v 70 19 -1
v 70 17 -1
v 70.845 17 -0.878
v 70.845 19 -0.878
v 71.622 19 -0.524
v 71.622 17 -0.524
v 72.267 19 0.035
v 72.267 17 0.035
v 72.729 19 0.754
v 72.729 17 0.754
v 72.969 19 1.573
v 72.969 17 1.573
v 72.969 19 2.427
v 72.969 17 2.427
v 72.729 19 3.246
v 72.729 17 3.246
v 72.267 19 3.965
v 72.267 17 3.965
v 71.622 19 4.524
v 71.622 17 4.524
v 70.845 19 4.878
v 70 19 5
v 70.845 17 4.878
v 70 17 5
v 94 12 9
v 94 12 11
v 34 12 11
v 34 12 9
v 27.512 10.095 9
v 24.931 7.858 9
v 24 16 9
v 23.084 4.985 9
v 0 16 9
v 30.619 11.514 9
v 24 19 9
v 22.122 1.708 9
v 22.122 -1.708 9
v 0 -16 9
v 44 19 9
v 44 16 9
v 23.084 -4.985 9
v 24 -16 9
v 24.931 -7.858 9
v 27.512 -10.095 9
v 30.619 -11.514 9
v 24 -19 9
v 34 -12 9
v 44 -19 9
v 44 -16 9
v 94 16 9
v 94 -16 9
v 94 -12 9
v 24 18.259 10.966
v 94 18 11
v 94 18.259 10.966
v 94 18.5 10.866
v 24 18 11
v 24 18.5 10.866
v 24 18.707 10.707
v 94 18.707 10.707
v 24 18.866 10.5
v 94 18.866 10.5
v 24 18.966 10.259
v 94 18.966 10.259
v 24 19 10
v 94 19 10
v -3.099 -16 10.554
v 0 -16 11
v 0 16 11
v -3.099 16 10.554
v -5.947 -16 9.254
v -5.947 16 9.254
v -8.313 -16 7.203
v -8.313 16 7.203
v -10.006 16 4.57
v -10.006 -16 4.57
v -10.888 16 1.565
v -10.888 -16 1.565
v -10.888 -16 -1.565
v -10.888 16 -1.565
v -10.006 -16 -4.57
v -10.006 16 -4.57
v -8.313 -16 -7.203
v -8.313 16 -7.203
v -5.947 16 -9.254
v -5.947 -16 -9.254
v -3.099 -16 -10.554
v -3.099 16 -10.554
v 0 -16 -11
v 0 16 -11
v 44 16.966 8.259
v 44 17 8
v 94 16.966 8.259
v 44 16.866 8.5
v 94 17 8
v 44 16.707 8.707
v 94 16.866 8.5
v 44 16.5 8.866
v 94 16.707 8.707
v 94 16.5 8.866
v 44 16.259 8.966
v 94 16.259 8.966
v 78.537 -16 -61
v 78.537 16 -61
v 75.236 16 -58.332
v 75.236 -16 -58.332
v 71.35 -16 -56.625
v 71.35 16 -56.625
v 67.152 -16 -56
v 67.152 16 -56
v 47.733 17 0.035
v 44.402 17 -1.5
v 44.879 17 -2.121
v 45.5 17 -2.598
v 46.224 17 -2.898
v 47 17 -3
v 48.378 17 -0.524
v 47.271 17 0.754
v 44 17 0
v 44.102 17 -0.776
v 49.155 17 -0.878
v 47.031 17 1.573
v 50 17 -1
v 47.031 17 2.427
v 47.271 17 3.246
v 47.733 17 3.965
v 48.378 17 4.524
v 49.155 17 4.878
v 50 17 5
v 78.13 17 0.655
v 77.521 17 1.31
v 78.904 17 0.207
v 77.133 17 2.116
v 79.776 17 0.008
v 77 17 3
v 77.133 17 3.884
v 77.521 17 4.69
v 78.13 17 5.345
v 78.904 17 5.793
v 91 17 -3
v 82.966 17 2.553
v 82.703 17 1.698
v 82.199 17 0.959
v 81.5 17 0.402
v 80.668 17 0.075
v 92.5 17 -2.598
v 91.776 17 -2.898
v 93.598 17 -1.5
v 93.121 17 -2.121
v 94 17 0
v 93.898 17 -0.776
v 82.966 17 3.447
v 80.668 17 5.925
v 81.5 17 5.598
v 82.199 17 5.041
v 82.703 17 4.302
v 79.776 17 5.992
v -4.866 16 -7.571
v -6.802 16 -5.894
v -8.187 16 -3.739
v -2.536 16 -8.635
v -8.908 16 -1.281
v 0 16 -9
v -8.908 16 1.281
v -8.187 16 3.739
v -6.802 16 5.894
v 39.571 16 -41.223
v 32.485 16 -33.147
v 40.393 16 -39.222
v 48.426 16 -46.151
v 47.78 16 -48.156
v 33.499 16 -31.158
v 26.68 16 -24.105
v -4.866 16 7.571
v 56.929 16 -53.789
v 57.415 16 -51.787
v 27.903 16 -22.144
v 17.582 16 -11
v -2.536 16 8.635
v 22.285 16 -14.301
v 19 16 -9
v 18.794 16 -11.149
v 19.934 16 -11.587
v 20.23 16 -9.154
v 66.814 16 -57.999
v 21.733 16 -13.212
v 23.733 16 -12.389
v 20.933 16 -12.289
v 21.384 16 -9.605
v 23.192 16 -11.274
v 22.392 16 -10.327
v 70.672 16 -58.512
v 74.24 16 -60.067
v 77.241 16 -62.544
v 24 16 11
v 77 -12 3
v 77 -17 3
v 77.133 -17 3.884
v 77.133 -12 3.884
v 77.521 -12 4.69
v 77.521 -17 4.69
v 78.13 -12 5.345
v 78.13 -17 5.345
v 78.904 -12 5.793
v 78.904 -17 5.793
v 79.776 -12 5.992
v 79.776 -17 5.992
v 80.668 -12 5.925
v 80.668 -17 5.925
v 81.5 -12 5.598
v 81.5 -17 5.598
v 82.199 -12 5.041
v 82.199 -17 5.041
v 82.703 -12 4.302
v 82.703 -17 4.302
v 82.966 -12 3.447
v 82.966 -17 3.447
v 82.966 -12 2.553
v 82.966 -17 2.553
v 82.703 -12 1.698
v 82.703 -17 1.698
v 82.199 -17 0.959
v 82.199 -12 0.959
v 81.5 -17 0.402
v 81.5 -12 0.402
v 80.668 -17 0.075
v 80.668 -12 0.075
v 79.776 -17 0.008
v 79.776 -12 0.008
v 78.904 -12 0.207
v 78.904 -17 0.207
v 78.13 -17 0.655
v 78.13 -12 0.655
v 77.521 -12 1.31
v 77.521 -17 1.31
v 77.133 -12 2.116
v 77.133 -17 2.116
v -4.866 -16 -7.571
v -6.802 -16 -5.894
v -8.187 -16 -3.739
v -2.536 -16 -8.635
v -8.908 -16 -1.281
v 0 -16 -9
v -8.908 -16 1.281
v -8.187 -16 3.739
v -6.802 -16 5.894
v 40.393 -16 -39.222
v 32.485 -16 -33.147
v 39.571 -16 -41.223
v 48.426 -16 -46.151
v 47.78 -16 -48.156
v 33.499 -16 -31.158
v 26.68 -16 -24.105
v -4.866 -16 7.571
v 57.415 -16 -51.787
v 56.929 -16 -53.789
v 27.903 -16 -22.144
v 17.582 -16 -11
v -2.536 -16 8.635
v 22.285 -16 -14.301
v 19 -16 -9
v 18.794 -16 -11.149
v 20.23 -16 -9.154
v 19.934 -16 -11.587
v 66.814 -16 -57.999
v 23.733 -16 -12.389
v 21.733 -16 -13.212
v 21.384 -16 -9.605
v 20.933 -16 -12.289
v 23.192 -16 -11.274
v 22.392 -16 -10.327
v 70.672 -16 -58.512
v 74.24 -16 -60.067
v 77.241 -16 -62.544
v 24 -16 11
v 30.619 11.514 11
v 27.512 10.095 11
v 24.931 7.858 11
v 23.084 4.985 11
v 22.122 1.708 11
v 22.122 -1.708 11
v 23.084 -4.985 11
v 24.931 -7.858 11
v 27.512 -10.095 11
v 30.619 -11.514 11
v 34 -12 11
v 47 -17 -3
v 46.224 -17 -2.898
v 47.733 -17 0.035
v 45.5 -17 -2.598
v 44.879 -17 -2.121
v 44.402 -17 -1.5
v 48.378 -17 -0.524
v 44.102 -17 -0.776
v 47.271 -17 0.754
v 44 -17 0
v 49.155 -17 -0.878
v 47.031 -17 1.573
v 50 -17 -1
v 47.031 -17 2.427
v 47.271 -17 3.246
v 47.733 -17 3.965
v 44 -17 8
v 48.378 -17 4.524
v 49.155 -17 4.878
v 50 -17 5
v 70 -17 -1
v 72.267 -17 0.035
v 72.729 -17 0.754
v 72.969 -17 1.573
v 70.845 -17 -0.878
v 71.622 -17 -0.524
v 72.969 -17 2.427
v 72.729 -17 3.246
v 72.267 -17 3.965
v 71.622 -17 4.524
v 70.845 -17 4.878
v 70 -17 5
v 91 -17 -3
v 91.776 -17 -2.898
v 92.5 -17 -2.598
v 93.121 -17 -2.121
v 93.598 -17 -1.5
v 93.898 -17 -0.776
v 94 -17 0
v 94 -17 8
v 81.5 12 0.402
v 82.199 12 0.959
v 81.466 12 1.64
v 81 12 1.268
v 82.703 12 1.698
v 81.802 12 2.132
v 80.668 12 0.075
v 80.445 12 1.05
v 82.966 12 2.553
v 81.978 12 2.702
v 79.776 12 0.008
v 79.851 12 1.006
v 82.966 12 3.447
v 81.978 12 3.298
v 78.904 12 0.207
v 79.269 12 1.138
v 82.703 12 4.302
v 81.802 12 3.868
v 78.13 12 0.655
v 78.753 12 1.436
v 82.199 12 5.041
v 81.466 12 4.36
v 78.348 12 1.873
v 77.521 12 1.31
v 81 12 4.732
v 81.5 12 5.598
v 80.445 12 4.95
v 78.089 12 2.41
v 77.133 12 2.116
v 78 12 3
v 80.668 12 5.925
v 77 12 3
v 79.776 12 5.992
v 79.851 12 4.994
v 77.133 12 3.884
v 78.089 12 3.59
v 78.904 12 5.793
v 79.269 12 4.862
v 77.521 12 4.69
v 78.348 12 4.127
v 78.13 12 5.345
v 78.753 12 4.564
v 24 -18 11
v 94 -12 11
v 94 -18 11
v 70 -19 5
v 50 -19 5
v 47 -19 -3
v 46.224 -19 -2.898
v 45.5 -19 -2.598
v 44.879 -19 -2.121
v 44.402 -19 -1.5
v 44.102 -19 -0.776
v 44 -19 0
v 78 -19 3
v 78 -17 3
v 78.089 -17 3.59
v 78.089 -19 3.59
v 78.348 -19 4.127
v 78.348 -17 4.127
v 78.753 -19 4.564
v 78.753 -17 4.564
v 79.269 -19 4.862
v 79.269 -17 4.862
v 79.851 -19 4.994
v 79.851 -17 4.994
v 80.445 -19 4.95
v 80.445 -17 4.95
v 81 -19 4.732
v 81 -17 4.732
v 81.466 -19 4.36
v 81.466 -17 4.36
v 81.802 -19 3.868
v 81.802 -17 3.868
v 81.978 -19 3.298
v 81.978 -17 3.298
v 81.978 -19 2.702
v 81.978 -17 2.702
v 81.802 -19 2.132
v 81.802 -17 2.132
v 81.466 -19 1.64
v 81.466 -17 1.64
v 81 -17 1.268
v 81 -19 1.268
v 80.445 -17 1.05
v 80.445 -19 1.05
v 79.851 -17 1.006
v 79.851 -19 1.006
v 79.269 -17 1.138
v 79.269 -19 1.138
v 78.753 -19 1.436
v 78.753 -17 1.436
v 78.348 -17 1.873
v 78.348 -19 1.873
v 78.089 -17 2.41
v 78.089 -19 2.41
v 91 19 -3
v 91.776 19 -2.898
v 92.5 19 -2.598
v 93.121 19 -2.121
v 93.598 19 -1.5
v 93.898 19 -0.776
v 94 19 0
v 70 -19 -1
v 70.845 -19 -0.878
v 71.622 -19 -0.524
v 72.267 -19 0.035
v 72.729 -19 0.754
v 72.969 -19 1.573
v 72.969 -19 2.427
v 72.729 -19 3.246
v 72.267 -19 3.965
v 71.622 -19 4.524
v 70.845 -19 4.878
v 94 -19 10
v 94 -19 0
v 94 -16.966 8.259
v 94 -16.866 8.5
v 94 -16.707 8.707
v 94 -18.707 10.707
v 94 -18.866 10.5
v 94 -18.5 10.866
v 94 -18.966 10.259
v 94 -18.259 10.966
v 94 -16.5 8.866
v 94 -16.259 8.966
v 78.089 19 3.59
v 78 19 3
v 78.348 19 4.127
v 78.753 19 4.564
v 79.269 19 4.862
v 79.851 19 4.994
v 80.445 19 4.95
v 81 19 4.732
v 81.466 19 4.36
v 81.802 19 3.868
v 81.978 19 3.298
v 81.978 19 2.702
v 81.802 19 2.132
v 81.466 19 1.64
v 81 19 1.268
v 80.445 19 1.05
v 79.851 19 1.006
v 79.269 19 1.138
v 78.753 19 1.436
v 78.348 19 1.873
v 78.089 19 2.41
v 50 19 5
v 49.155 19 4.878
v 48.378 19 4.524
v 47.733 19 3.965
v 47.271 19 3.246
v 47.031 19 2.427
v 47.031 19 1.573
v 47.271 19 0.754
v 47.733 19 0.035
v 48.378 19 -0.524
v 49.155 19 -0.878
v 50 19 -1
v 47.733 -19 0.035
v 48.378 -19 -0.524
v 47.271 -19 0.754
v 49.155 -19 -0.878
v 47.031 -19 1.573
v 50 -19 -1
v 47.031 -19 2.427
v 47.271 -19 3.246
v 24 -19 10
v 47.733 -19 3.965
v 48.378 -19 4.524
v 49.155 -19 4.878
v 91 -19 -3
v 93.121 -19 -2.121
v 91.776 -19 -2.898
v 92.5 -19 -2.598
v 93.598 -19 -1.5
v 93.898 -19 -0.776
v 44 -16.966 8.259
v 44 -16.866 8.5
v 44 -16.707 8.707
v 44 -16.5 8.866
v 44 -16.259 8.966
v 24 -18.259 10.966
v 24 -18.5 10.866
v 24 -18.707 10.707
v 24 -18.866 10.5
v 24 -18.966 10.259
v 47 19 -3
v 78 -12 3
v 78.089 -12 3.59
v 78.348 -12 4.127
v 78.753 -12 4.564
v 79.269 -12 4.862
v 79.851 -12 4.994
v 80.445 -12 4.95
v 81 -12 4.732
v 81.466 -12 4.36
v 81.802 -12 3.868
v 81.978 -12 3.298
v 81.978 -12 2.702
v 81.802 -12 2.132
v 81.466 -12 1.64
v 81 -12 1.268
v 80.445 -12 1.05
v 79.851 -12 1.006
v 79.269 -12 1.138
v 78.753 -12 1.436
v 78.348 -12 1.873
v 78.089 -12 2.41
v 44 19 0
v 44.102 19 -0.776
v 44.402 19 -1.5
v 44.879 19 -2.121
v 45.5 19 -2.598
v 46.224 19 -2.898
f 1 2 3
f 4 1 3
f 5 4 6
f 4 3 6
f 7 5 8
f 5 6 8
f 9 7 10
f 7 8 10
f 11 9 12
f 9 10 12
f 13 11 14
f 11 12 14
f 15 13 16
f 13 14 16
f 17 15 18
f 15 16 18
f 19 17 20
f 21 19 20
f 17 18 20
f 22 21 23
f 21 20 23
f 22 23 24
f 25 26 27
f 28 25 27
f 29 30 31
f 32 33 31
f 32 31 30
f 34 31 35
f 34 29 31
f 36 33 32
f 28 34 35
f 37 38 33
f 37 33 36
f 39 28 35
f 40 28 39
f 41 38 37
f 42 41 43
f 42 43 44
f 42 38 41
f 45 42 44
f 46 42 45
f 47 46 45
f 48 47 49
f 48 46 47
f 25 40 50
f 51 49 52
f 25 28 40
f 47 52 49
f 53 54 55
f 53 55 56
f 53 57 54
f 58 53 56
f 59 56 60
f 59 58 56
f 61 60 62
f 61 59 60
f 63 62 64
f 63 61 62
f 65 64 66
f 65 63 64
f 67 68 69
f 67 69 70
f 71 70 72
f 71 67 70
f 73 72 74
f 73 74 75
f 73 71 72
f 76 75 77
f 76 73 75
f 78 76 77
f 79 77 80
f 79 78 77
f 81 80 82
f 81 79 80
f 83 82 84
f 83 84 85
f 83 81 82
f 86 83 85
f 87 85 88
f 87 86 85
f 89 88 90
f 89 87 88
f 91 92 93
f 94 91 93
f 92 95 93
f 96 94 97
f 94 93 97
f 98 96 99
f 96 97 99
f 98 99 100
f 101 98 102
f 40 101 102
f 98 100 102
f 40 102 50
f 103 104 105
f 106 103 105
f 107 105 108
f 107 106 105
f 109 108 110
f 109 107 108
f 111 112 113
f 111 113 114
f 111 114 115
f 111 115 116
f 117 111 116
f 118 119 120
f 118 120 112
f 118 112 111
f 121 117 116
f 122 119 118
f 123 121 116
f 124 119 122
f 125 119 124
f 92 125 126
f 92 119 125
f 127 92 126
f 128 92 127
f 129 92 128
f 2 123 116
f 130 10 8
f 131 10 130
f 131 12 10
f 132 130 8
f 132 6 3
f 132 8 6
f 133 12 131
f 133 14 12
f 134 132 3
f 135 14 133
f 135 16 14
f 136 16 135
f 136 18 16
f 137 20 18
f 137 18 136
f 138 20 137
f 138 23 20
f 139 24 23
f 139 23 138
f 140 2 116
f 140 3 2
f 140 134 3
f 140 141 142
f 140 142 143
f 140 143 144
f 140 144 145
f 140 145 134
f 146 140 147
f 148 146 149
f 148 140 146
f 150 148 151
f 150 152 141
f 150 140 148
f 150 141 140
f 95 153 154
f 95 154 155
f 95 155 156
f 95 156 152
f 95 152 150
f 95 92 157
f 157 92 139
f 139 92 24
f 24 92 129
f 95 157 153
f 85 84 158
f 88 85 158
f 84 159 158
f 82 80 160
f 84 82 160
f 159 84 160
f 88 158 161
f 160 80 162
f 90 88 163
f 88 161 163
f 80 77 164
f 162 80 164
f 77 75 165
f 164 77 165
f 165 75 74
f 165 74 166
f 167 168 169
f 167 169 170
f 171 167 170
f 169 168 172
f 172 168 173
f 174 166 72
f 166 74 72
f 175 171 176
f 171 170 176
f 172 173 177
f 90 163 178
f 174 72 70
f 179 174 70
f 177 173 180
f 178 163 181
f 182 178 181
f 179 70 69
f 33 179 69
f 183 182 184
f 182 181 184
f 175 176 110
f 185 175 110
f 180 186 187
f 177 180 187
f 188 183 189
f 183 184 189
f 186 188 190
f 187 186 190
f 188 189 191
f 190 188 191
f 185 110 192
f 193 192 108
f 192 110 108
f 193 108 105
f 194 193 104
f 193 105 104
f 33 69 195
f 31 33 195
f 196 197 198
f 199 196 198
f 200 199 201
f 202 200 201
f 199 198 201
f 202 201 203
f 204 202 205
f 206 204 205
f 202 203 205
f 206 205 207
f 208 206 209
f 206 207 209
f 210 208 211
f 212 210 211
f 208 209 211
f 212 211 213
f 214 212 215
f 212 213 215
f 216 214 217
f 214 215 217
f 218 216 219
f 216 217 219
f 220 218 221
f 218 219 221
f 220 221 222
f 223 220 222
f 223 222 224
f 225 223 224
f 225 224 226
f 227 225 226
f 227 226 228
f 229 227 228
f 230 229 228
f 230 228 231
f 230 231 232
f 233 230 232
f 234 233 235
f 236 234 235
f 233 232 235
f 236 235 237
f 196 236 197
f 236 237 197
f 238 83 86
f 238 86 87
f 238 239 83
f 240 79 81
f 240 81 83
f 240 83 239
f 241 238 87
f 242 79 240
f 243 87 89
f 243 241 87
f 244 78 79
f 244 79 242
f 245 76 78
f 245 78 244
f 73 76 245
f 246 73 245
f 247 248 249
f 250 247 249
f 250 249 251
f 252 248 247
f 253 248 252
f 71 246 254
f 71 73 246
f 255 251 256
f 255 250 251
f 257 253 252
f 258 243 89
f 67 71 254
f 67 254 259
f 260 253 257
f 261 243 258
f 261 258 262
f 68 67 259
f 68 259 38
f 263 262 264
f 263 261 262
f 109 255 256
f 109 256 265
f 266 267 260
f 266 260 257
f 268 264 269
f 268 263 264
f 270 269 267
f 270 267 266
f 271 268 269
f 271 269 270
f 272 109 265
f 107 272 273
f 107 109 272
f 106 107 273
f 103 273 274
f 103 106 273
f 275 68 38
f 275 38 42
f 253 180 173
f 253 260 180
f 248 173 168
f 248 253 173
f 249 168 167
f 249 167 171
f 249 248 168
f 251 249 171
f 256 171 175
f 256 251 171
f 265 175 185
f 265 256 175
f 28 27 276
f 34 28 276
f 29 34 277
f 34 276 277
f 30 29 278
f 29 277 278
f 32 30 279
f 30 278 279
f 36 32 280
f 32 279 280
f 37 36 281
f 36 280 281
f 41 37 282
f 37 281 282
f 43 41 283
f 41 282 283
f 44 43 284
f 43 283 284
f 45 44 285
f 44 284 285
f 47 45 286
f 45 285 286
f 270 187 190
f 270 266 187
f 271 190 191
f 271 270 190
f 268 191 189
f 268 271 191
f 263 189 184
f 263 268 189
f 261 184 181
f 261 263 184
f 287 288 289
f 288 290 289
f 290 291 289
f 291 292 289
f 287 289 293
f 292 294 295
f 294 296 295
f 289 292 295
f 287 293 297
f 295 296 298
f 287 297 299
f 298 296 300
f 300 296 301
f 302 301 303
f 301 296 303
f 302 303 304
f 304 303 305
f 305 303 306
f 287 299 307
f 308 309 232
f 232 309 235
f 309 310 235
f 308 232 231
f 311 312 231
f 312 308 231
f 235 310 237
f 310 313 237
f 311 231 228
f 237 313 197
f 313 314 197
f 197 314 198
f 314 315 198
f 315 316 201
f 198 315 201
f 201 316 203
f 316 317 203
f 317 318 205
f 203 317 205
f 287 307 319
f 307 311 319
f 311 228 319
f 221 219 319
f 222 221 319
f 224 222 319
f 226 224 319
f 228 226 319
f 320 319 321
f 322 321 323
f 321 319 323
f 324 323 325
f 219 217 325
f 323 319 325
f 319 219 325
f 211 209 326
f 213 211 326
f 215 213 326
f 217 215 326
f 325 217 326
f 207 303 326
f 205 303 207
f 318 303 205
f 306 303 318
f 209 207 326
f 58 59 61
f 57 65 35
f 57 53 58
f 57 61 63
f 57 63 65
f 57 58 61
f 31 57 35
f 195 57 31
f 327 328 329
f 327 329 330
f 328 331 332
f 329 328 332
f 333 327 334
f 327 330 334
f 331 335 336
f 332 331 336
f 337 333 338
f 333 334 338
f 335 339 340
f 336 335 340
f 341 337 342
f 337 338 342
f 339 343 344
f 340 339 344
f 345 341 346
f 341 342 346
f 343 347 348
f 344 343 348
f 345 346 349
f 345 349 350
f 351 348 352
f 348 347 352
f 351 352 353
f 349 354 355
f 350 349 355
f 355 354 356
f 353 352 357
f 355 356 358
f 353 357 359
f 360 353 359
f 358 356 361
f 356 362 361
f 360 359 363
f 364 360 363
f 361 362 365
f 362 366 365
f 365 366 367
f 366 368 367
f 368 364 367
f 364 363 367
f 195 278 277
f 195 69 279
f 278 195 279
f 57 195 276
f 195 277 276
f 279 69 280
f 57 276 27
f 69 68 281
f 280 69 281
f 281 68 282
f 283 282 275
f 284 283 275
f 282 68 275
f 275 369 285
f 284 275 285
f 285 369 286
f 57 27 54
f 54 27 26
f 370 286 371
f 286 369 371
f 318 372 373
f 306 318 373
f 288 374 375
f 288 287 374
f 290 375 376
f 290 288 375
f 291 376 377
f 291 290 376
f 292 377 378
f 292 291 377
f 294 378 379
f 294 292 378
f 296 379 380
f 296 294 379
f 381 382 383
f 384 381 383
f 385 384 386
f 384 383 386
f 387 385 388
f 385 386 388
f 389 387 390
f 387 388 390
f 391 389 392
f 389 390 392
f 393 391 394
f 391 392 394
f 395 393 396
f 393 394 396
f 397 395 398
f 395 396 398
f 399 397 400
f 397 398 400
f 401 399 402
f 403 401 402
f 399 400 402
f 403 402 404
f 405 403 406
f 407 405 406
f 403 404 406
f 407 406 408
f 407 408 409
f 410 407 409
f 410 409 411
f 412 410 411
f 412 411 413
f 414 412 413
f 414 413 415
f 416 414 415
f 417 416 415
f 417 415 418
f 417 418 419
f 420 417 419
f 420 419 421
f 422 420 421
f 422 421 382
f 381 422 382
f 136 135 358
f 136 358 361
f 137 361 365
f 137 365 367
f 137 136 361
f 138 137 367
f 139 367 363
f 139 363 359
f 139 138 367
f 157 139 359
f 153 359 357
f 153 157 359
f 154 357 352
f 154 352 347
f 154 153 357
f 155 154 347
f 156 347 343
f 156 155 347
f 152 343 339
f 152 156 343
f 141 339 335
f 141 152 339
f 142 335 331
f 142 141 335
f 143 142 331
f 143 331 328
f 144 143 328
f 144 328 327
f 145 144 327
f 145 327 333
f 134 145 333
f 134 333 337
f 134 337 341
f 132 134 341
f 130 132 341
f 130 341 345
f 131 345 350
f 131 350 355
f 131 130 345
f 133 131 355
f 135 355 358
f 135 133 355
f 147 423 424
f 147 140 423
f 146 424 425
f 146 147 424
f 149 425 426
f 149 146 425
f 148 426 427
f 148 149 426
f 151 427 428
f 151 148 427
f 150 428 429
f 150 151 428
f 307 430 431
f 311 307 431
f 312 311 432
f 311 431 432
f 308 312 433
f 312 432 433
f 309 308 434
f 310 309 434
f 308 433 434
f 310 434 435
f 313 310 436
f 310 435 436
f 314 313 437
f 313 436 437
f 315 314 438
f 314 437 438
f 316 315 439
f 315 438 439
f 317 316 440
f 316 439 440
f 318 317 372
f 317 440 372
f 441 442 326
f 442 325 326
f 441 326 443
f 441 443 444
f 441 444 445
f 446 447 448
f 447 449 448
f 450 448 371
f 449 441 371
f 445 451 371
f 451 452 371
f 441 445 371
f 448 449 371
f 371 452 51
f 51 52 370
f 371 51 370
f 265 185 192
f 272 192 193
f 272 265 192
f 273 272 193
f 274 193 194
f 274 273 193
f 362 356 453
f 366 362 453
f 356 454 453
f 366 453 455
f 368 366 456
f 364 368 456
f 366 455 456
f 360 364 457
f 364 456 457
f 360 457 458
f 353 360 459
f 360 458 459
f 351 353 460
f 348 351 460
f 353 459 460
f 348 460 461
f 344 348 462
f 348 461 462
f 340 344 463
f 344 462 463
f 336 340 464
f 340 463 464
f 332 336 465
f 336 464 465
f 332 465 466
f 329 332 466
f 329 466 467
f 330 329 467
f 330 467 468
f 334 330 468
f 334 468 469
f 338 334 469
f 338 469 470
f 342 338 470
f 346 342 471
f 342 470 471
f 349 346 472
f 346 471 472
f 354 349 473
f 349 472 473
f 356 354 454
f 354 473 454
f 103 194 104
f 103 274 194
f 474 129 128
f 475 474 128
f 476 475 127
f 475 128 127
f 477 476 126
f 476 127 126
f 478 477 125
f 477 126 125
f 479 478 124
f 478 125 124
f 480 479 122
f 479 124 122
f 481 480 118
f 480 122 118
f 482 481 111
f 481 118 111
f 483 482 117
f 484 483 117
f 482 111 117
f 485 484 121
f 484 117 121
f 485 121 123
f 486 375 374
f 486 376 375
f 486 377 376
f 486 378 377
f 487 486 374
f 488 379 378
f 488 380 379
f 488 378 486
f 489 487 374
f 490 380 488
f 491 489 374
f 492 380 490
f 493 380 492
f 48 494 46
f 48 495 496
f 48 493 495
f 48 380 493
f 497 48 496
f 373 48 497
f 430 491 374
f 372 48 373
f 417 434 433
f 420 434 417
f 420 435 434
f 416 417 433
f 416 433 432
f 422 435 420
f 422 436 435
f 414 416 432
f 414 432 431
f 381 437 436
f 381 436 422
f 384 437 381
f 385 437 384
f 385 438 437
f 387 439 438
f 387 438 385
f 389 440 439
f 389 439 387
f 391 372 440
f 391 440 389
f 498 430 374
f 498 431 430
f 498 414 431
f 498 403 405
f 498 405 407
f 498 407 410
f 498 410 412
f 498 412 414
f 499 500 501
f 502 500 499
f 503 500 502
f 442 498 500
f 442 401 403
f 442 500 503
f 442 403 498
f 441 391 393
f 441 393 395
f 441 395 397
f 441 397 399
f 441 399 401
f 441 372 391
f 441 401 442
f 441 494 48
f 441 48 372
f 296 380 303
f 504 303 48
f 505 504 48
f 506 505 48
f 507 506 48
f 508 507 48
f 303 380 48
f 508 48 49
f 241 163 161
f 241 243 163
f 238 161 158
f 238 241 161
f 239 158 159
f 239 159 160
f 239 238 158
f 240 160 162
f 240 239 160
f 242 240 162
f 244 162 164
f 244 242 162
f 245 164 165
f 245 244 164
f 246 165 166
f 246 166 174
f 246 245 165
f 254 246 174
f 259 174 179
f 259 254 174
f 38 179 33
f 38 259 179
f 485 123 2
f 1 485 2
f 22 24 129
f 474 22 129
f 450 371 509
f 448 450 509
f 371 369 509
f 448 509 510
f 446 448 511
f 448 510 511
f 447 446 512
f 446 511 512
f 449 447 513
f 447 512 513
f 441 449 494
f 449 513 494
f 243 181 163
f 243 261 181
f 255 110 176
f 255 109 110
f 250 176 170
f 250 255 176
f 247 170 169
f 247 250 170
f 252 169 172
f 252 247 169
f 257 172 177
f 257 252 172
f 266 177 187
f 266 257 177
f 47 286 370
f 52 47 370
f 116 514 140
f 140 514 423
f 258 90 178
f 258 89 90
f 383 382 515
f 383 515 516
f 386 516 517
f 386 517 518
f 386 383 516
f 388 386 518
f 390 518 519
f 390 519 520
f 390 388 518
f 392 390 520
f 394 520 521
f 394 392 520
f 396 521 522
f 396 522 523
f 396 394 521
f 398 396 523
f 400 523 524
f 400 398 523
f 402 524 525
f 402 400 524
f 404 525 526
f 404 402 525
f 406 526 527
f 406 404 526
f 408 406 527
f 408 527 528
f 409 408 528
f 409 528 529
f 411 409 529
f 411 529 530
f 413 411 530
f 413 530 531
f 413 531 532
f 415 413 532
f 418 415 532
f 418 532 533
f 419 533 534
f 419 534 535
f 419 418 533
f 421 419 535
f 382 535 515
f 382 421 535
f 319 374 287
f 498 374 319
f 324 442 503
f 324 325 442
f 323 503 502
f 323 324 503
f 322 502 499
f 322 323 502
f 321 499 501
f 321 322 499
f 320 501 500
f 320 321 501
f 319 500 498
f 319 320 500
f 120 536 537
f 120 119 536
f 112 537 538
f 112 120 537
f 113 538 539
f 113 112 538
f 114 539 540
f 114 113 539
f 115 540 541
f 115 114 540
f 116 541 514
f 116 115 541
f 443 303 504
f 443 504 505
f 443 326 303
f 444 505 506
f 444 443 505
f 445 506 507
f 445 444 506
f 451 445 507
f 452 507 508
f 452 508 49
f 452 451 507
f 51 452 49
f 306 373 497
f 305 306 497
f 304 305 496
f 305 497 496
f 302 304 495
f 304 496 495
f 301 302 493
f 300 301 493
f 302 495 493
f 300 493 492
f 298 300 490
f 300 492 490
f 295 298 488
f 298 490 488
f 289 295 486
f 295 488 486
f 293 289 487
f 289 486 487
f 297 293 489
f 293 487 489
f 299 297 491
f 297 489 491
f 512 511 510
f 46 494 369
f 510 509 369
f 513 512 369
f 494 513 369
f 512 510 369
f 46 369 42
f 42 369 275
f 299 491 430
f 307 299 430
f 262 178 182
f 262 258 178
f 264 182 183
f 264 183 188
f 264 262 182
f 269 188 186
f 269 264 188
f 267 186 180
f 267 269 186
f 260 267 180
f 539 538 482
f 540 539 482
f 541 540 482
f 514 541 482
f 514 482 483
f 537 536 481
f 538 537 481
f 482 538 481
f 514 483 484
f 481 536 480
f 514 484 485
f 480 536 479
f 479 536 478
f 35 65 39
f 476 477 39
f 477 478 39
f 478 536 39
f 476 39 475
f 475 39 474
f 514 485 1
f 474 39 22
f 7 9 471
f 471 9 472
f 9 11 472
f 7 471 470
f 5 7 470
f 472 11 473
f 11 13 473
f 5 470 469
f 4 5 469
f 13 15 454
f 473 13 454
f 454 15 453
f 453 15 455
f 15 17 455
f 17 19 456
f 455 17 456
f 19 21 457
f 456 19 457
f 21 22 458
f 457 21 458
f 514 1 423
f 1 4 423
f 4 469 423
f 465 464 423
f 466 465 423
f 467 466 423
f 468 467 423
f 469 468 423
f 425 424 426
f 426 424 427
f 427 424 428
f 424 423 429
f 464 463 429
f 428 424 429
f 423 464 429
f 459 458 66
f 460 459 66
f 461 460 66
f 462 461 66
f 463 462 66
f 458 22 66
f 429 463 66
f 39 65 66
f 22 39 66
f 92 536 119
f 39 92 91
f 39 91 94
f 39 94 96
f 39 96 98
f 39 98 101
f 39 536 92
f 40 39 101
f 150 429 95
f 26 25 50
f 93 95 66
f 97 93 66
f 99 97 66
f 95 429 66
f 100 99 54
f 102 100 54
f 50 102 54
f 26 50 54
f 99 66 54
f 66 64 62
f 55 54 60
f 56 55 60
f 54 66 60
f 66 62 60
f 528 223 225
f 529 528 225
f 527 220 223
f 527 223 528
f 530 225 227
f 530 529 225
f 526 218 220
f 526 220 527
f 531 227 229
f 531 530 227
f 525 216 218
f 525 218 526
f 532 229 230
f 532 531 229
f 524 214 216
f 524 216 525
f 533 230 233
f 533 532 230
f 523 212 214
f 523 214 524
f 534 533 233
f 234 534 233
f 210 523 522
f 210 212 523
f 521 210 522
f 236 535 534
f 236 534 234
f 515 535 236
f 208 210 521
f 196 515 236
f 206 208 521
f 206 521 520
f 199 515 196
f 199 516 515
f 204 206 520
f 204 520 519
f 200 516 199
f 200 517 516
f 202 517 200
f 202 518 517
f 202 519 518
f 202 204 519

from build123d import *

# Parameters (mm, degrees)
F1_DEPTH  = 16
F2_W      = 70
F2_H      = 3
F3_DEPTH  = 2
F4_W      = 50
F4_H      = 14
F5_DEPTH  = 2
F6_R      = 1
F9_DEPTH  = 2
F11_DEPTH = 38.001
F13_D     = 4
F14_R     = 3
F14_R_2   = 2
F15_DEPTH = 5
F16_R     = 3


# Not quite as in the source:
# - a pattern or mirror of a feature is missing from the dataset's text; its kind, count and spacing are read off the source's solid


with BuildPart() as f1:
    # F0 (on Front) → F1 (new body)
    with BuildSketch(Plane.XZ):
        with BuildLine():
            Line((94, 11), (0, 11))
            ThreePointArc((0, 11), (-11, 0), (0, -11))
            Line((0, -11), (17.5822146692, -11))
            ThreePointArc((17.5822146692, -11), (20.4548889983, -11.9075994576), (22.2846682622, -14.3009031203))
            ThreePointArc((22.2846682622, -14.3009031203), (39.5706846565, -41.223441559), (66.8144425174, -57.9986344457))
            ThreePointArc((66.8144425174, -57.9986344457), (72.5102657096, -59.1645299936), (77.2413235191, -62.5437024171))
            Line((77.2413235191, -62.5437024171), (78.536643648, -61))
            ThreePointArc((78.536643648, -61), (73.3497255449, -57.3487659198), (67.1516242057, -56))
            ThreePointArc((67.1516242057, -56), (40.3930033582, -39.2216179023), (23.7333333333, -12.3889272035))
            ThreePointArc((23.7333333333, -12.3889272035), (21.9107246536, -9.9345748081), (19, -9))
            Line((19, -9), (0, -9))
            ThreePointArc((0, -9), (-9, 0), (0, 9))
            Line((0, 9), (94, 9))
            Line((94, 9), (94, 11))
        make_face()
    extrude(amount=F1_DEPTH)

    # F2 (on face) → F3 (join)
    with BuildSketch(Plane.XY.offset(11)):
        with Locations((59, -17.5)):
            Rectangle(F2_W, F2_H)
    extrude(amount=-F3_DEPTH)

    # F4 (on face) → F5 (join)
    with BuildSketch(Plane.XZ.offset(19)):
        with Locations((69, 4)):
            Rectangle(F4_W, F4_H)
    extrude(amount=-F5_DEPTH)

    # F6
    f6_edges = [f1.edges().sort_by_distance(p)[0] for p in [
        (59, -19, 11),
        (69, -17, 9),
    ]]
    fillet(f6_edges, radius=F6_R)

    # F7: F1 across plane


with BuildPart() as f1_1:
    add(f1.part)
    add(f1.part.mirror(Plane.XZ))

    # F8 (on face) → F9 (cut)
    with BuildSketch(Plane.XY.offset(11)):
        with BuildLine():
            Line((94, 12), (34, 12))
            ThreePointArc((34, 12), (22, 0), (34, -12))
            Line((34, -12), (94, -12))
            Line((94, -12), (94, 12))
        make_face()
    extrude(amount=-F9_DEPTH, mode=Mode.SUBTRACT)

    # F10 (on face) → F11 (cut, through all)
    with BuildSketch(Plane.XZ.offset(19)):
        with BuildLine():
            ThreePointArc((50, 5), (47, 2), (50, -1))
            Line((50, -1), (70, -1))
            ThreePointArc((70, -1), (73, 2), (70, 5))
            Line((70, 5), (50, 5))
        make_face()
    extrude(amount=-F11_DEPTH, mode=Mode.SUBTRACT)

    # F13 (through all)
    with Locations(Plane.XZ.offset(19)):
        with Locations((80, 3)):
            Hole(F13_D / 2)

    # F14 (on face) → F15 (join)
    with BuildSketch(Plane(origin=(0, -17, 0), x_dir=(-1, 0, 0), z_dir=(0, 1, 0))):
        with Locations((-80, 3)):
            Circle(F14_R)
        with Locations((-80, 3)):
            Circle(F14_R_2, mode=Mode.SUBTRACT)
    f15 = extrude(amount=F15_DEPTH)

    # F15_copies: F15 across plane
    add(f15.mirror(Plane.ZX))

    # F16
    f16_edges = [f1_1.edges().sort_by_distance(p)[0] for p in [
        (44, -18, -3),
        (94, -18, -3),
        (44, 18, -3),
        (94, 18, -3),
    ]]
    fillet(f16_edges, radius=F16_R)


solid = f1_1.part
